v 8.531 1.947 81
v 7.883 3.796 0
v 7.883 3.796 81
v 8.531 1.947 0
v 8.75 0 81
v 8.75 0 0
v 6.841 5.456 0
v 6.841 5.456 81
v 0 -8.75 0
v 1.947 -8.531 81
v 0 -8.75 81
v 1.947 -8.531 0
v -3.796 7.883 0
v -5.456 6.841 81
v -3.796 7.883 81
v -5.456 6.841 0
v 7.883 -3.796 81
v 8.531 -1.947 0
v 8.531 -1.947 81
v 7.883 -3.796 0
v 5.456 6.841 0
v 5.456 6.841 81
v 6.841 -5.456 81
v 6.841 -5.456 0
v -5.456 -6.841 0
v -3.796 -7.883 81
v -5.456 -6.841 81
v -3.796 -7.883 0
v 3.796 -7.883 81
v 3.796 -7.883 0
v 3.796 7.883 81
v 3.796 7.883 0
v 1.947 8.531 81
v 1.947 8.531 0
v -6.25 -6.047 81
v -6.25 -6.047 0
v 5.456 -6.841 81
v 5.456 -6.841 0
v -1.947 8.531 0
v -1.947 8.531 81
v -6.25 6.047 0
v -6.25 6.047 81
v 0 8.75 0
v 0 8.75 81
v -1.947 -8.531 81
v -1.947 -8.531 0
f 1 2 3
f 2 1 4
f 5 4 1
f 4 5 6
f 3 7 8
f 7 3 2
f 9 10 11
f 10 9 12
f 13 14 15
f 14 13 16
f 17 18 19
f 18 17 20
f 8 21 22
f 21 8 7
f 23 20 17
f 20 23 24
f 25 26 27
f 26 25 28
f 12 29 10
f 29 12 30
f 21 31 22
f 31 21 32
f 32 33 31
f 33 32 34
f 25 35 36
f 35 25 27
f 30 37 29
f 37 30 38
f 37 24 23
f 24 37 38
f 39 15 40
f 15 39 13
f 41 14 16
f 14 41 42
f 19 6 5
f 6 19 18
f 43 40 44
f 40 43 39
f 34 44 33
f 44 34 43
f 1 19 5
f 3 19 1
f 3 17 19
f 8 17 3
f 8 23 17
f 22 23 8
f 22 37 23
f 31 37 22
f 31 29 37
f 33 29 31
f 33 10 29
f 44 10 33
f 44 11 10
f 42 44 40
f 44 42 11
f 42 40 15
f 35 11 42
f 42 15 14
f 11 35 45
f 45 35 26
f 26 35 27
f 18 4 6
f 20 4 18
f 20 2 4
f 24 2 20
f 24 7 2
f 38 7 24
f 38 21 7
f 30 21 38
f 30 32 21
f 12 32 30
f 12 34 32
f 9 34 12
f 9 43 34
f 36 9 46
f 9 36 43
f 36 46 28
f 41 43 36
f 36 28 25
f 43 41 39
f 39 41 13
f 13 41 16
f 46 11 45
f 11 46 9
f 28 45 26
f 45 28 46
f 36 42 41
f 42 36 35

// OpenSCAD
h = 81; // delka
d = 17.5;
x = 12.5;
a = 0;

difference() {
  cylinder(d=d, h=h);
  //translate([x/2+10,0,h/2]) cube([20,20,h], true);
  translate([-x/2-10,0,h/2]) cube([20,20,h], true);
}
/*
rotate([0,a,0])
translate([0,0,h])
difference() {
  cylinder(d=d, h=h);
  //translate([x/2+10,0,h/2]) cube([20,20,h], true);
  translate([-x/2-10,0,h/2]) cube([20,20,h], true);
}*/
